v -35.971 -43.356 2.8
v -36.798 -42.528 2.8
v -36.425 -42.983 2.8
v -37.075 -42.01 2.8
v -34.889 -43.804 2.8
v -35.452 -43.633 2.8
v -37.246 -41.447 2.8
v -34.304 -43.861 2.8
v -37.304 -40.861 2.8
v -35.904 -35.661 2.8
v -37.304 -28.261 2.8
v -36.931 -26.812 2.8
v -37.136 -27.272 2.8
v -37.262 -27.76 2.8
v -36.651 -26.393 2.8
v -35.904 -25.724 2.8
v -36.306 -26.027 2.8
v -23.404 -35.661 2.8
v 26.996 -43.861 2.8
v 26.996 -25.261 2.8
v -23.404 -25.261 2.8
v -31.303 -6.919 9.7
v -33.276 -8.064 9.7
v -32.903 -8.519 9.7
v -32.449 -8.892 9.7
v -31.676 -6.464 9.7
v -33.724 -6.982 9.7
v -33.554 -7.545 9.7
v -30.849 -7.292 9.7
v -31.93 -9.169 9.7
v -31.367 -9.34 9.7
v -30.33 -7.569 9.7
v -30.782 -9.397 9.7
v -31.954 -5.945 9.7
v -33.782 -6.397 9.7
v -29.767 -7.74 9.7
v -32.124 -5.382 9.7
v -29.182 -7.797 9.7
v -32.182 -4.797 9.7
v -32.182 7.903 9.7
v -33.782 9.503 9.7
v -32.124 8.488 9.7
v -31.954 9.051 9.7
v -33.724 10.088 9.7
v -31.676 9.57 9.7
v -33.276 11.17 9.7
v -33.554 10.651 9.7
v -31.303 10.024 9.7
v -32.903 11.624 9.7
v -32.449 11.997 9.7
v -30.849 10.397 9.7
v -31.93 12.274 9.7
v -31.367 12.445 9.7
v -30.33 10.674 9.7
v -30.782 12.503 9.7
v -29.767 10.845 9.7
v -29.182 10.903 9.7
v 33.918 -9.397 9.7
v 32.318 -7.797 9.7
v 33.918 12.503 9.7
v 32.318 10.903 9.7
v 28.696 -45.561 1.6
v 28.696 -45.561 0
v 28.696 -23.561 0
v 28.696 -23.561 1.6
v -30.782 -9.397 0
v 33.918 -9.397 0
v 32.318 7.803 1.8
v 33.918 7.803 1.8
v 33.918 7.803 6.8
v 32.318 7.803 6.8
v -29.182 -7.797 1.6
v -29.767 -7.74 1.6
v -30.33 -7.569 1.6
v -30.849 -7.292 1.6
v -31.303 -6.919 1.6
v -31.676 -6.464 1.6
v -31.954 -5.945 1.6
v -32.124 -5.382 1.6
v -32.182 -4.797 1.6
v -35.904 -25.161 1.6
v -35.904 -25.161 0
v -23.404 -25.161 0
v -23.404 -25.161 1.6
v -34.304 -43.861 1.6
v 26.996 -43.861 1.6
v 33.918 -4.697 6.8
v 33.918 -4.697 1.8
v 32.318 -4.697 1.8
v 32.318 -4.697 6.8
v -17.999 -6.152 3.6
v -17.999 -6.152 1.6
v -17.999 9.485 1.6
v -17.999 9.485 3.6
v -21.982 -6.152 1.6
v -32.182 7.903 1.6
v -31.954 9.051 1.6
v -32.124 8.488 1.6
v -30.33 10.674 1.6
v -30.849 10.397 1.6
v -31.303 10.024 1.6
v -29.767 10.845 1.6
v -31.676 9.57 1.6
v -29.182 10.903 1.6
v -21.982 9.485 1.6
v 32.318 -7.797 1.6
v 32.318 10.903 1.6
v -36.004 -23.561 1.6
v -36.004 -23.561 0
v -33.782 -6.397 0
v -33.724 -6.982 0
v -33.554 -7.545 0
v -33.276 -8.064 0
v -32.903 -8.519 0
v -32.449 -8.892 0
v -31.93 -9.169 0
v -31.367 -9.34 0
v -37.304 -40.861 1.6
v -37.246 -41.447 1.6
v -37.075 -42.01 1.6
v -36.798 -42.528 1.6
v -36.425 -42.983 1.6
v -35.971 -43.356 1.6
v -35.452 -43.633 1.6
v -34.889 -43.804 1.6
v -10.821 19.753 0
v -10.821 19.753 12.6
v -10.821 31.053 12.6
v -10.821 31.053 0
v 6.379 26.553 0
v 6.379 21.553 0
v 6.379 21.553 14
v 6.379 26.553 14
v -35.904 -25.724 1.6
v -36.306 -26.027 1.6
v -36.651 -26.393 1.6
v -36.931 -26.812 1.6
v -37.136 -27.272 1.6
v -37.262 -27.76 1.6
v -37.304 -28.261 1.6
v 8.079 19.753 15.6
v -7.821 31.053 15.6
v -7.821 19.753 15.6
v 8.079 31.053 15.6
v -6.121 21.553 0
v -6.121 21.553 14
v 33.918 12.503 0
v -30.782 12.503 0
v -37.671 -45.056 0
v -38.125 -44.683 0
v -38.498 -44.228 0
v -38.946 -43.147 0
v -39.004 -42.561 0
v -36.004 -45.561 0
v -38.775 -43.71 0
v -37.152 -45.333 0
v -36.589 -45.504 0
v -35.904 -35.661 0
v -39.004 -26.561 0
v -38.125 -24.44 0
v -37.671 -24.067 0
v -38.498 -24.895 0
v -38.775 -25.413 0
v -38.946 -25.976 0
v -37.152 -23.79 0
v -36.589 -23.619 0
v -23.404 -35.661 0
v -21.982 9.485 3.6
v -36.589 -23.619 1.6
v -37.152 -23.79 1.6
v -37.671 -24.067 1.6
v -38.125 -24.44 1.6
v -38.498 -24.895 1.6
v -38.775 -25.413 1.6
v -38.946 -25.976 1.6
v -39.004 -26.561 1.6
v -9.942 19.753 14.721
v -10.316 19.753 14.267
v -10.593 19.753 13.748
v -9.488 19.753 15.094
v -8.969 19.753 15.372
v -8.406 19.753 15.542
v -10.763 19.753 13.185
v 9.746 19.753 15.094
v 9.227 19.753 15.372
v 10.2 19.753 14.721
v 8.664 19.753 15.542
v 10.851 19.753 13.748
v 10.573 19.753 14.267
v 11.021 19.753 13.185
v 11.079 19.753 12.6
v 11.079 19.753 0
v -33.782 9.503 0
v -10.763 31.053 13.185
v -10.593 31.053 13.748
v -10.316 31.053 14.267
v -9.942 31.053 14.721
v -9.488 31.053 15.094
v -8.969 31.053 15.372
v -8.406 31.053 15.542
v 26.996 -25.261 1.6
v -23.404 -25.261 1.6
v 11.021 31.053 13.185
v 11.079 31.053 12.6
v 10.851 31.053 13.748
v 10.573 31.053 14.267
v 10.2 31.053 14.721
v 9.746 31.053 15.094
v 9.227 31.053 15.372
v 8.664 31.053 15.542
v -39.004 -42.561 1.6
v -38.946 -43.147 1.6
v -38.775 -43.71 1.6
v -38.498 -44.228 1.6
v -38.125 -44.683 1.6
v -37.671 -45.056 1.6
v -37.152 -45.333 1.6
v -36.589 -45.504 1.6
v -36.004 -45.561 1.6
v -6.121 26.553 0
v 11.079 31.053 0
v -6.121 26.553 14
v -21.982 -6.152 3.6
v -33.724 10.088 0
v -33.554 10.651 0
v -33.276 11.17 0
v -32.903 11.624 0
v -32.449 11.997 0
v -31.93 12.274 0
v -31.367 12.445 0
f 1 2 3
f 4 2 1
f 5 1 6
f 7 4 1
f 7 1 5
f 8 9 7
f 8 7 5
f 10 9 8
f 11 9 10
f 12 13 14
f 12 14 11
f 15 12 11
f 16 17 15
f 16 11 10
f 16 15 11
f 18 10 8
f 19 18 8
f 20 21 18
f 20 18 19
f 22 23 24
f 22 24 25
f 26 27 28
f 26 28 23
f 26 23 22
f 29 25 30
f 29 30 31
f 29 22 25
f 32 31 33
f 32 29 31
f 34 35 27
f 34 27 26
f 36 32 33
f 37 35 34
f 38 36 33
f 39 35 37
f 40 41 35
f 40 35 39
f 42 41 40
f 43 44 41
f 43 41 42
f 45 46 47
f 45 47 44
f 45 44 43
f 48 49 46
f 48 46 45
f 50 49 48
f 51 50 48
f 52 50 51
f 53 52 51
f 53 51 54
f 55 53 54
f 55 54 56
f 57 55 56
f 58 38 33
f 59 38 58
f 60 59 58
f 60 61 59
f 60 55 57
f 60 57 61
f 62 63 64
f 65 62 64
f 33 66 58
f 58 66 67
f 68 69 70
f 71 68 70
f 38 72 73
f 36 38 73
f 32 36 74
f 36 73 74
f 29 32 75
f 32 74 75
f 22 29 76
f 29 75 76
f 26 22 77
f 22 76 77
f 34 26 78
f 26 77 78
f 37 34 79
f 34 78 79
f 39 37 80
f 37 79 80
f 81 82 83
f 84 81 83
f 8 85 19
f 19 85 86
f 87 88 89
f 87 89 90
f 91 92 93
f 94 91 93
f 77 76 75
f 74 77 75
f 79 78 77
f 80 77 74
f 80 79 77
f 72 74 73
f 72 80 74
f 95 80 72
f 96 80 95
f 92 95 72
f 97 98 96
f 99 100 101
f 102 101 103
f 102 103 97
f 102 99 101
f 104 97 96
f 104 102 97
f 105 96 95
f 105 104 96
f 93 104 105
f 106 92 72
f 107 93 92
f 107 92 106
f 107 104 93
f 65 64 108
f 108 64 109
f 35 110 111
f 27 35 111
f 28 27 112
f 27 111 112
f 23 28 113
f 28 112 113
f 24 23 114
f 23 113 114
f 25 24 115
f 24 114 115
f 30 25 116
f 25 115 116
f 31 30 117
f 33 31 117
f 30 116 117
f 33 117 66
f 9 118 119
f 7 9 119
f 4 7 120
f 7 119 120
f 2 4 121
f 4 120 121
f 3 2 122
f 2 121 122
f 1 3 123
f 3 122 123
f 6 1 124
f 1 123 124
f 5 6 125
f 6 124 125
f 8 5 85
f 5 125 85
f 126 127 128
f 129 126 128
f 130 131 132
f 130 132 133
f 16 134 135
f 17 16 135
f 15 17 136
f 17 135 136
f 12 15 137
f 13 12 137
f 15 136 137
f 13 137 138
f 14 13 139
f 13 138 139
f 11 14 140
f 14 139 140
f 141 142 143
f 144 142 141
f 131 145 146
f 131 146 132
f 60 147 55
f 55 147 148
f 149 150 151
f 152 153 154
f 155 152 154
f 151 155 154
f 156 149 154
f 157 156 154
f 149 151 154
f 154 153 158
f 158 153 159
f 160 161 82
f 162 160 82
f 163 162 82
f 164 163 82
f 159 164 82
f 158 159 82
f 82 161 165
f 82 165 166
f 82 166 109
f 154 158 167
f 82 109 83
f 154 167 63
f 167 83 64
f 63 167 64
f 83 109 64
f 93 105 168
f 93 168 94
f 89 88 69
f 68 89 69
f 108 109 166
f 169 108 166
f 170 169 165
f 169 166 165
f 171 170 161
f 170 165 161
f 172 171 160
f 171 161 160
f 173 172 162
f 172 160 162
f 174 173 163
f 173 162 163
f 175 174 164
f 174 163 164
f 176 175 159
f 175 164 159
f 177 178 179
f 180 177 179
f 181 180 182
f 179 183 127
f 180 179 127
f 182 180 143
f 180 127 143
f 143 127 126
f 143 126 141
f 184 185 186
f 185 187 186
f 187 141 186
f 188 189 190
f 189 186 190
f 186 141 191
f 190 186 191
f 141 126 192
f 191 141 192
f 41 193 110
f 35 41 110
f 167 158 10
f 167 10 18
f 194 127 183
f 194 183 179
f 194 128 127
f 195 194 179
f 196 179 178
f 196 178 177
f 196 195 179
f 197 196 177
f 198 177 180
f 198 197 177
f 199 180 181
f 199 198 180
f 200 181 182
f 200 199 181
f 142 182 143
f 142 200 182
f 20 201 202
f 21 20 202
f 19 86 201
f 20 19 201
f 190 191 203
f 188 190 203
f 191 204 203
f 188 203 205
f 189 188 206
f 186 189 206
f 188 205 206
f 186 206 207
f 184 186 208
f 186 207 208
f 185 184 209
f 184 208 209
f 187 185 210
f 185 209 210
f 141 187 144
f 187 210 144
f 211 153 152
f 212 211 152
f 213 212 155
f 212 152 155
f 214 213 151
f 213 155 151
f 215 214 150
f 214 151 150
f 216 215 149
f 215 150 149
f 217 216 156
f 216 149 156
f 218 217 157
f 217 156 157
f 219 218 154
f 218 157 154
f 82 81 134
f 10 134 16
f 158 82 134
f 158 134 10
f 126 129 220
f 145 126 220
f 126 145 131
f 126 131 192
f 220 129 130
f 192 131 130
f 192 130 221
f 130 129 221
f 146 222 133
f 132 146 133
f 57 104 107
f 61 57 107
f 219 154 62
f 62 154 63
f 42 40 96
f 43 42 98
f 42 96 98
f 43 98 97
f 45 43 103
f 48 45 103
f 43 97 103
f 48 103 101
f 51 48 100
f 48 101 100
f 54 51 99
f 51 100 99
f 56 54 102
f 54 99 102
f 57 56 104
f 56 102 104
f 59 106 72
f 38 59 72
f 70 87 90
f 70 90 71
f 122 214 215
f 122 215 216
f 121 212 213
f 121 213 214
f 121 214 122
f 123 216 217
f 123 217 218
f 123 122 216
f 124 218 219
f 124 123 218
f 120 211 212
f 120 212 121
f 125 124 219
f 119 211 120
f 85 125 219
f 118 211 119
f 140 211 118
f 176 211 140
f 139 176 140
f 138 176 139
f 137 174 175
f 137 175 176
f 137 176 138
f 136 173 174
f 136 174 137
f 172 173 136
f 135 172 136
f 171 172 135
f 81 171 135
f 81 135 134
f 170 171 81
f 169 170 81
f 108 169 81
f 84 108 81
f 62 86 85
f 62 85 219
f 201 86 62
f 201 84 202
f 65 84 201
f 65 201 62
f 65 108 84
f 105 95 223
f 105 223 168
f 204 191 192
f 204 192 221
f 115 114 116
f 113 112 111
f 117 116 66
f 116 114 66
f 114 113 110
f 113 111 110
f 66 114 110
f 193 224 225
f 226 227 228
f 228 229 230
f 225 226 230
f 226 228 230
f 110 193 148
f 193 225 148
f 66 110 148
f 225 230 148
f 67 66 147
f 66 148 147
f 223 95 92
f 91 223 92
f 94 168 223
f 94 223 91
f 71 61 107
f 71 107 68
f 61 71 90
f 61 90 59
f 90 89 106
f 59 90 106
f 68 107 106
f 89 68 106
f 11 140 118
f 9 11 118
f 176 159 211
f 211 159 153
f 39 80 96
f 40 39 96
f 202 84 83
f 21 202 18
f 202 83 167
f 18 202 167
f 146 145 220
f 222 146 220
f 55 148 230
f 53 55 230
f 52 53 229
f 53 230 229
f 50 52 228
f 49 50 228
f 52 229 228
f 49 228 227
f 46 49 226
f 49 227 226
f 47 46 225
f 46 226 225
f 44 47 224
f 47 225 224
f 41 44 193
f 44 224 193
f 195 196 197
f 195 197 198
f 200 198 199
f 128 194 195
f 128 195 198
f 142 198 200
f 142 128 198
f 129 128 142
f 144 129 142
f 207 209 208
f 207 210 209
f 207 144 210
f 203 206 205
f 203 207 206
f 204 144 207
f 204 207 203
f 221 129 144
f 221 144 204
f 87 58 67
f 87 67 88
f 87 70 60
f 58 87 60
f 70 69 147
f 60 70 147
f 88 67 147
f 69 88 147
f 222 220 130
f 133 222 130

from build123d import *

# Parameters (mm, degrees)
F1_DEPTH  = 9.7
F2_DEPTH  = 1.6
F3_W      = 12.5
F3_H      = 5
F4_DEPTH  = 1.6
F5_W      = 3.982823
F5_H      = 15.637309
F6_DEPTH  = 2
F8_DEPTH  = 1.6
F9_DEPTH  = 2.8
F10_W     = 12.5
F10_H     = 10.5
F11_DEPTH = 9.701
F12_W     = 21.9
F12_H     = 11.3
F12_W_2   = 12.5
F12_H_2   = 5
F13_DEPTH = 14
F14_W     = 21.9
F14_H     = 11.3
F15_DEPTH = 1.6
F16_R     = 3


with BuildPart() as f1:
    # F0 (on Top) → F1 (new body)
    with BuildSketch(Plane.XY):
        with BuildLine():
            Line((33.918102, -9.397182), (33.918102, 12.502818))
            Line((33.918102, 12.502818), (-30.781898, 12.502818))
            ThreePointArc((-30.781898, 12.502818), (-32.903218, 11.624139), (-33.781898, 9.502818))
            Line((-33.781898, 9.502818), (-33.781898, -6.397182))
            ThreePointArc((-33.781898, -6.397182), (-32.903218, -8.518502), (-30.781898, -9.397182))
            Line((-30.781898, -9.397182), (33.918102, -9.397182))
        make_face()
        with BuildLine():
            Line((-29.181898, 10.902818), (32.318102, 10.902818))
            Line((32.318102, 10.902818), (32.318102, -7.797182))
            Line((32.318102, -7.797182), (-29.181898, -7.797182))
            ThreePointArc((-29.181898, -7.797182), (-31.303218, -6.918502), (-32.181898, -4.797182))
            Line((-32.181898, -4.797182), (-32.181898, 7.902818))
            ThreePointArc((-32.181898, 7.902818), (-31.303218, 10.024139), (-29.181898, 10.902818))
        make_face(mode=Mode.SUBTRACT)
    extrude(amount=F1_DEPTH)

    # F0 (on Top) → F2 (join)
    with BuildSketch(Plane.XY):
        with BuildLine():
            Line((32.318102, -7.797182), (32.318102, 10.902818))
            Line((32.318102, 10.902818), (-29.181898, 10.902818))
            ThreePointArc((-29.181898, 10.902818), (-31.303218, 10.024139), (-32.181898, 7.902818))
            Line((-32.181898, 7.902818), (-32.181898, -4.797182))
            ThreePointArc((-32.181898, -4.797182), (-31.303218, -6.918502), (-29.181898, -7.797182))
            Line((-29.181898, -7.797182), (32.318102, -7.797182))
        make_face()
    extrude(amount=F2_DEPTH)

    # F3 (on face) → F4 (cut, through all)
    with BuildSketch(Plane.YZ.offset(33.918102)):
        with Locations((1.552818, 4.3)):
            Rectangle(F3_W, F3_H)
    extrude(amount=-F4_DEPTH, mode=Mode.SUBTRACT)

    # F5 (on face) → F6 (join)
    with BuildSketch(Plane.XY.offset(1.6)):
        with Locations((-19.990486, 1.666645)):
            Rectangle(F5_W, F5_H)
    extrude(amount=F6_DEPTH)


with BuildPart() as f8:
    # F7 (on Top) → F8 (new body)
    with BuildSketch(Plane.XY):
        with BuildLine():
            ThreePointArc((-34.303793, -25.261457), (-36.425113, -26.140137), (-37.303793, -28.261457))
            Line((-37.303793, -28.261457), (-37.303793, -40.861457))
            ThreePointArc((-37.303793, -40.861457), (-36.425113, -42.982778), (-34.303793, -43.861457))
            Line((-34.303793, -43.861457), (26.996207, -43.861457))
            Line((26.996207, -43.861457), (26.996207, -25.261457))
            Line((26.996207, -25.261457), (-34.303793, -25.261457))
        make_face()
        with BuildLine():
            Line((28.696207, -45.561457), (28.696207, -23.561457))
            Line((28.696207, -23.561457), (-36.003793, -23.561457))
            ThreePointArc((-36.003793, -23.561457), (-38.125113, -24.440137), (-39.003793, -26.561457))
            Line((-39.003793, -26.561457), (-39.003793, -42.561457))
            ThreePointArc((-39.003793, -42.561457), (-38.125113, -44.682778), (-36.003793, -45.561457))
            Line((-36.003793, -45.561457), (28.696207, -45.561457))
        make_face()
        with BuildLine():
            Line((-37.303793, -40.861457), (-37.303793, -28.261457))
            ThreePointArc((-37.303793, -28.261457), (-36.425113, -26.140137), (-34.303793, -25.261457))
            Line((-34.303793, -25.261457), (26.996207, -25.261457))
            Line((26.996207, -25.261457), (26.996207, -43.861457))
            Line((26.996207, -43.861457), (-34.303793, -43.861457))
            ThreePointArc((-34.303793, -43.861457), (-36.425113, -42.982778), (-37.303793, -40.861457))
        make_face(mode=Mode.SUBTRACT)
    extrude(amount=F8_DEPTH)

    # F7 (on Top) → F9 (join)
    with BuildSketch(Plane.XY):
        with BuildLine():
            ThreePointArc((-34.303793, -25.261457), (-36.425113, -26.140137), (-37.303793, -28.261457))
            Line((-37.303793, -28.261457), (-37.303793, -40.861457))
            ThreePointArc((-37.303793, -40.861457), (-36.425113, -42.982778), (-34.303793, -43.861457))
            Line((-34.303793, -43.861457), (26.996207, -43.861457))
            Line((26.996207, -43.861457), (26.996207, -25.261457))
            Line((26.996207, -25.261457), (-34.303793, -25.261457))
        make_face()
    extrude(amount=F9_DEPTH)

    # F10 (on face) → F11 (cut, through all)
    with BuildSketch(Plane(origin=(0, 0, 0), x_dir=(1, 0, 0), z_dir=(0, 0, -1))):
        with Locations((-29.653793, 30.411457)):
            Rectangle(F10_W, F10_H)
    extrude(amount=-F11_DEPTH, mode=Mode.SUBTRACT)


with BuildPart() as f13:
    # F12 (on Top) → F13 (new body)
    with BuildSketch(Plane.XY):
        with Locations((0.128907, 25.403213)):
            Rectangle(F12_W, F12_H)
        with Locations((0.128907, 24.053213)):
            Rectangle(F12_W_2, F12_H_2, mode=Mode.SUBTRACT)
    extrude(amount=F13_DEPTH)

    # F14 (on face) → F15 (join)
    with BuildSketch(Plane.XY.offset(14)):
        with Locations((0.128907, 25.403213)):
            Rectangle(F14_W, F14_H)
    extrude(amount=F15_DEPTH)

    # F16
    f16_edges = [f13.edges().sort_by_distance(p)[0] for p in [
        (11.078907, 25.403213, 15.6),
        (-10.821093, 25.403213, 15.6),
    ]]
    fillet(f16_edges, radius=F16_R)


solid = Compound([f1.part, f8.part, f13.part])
